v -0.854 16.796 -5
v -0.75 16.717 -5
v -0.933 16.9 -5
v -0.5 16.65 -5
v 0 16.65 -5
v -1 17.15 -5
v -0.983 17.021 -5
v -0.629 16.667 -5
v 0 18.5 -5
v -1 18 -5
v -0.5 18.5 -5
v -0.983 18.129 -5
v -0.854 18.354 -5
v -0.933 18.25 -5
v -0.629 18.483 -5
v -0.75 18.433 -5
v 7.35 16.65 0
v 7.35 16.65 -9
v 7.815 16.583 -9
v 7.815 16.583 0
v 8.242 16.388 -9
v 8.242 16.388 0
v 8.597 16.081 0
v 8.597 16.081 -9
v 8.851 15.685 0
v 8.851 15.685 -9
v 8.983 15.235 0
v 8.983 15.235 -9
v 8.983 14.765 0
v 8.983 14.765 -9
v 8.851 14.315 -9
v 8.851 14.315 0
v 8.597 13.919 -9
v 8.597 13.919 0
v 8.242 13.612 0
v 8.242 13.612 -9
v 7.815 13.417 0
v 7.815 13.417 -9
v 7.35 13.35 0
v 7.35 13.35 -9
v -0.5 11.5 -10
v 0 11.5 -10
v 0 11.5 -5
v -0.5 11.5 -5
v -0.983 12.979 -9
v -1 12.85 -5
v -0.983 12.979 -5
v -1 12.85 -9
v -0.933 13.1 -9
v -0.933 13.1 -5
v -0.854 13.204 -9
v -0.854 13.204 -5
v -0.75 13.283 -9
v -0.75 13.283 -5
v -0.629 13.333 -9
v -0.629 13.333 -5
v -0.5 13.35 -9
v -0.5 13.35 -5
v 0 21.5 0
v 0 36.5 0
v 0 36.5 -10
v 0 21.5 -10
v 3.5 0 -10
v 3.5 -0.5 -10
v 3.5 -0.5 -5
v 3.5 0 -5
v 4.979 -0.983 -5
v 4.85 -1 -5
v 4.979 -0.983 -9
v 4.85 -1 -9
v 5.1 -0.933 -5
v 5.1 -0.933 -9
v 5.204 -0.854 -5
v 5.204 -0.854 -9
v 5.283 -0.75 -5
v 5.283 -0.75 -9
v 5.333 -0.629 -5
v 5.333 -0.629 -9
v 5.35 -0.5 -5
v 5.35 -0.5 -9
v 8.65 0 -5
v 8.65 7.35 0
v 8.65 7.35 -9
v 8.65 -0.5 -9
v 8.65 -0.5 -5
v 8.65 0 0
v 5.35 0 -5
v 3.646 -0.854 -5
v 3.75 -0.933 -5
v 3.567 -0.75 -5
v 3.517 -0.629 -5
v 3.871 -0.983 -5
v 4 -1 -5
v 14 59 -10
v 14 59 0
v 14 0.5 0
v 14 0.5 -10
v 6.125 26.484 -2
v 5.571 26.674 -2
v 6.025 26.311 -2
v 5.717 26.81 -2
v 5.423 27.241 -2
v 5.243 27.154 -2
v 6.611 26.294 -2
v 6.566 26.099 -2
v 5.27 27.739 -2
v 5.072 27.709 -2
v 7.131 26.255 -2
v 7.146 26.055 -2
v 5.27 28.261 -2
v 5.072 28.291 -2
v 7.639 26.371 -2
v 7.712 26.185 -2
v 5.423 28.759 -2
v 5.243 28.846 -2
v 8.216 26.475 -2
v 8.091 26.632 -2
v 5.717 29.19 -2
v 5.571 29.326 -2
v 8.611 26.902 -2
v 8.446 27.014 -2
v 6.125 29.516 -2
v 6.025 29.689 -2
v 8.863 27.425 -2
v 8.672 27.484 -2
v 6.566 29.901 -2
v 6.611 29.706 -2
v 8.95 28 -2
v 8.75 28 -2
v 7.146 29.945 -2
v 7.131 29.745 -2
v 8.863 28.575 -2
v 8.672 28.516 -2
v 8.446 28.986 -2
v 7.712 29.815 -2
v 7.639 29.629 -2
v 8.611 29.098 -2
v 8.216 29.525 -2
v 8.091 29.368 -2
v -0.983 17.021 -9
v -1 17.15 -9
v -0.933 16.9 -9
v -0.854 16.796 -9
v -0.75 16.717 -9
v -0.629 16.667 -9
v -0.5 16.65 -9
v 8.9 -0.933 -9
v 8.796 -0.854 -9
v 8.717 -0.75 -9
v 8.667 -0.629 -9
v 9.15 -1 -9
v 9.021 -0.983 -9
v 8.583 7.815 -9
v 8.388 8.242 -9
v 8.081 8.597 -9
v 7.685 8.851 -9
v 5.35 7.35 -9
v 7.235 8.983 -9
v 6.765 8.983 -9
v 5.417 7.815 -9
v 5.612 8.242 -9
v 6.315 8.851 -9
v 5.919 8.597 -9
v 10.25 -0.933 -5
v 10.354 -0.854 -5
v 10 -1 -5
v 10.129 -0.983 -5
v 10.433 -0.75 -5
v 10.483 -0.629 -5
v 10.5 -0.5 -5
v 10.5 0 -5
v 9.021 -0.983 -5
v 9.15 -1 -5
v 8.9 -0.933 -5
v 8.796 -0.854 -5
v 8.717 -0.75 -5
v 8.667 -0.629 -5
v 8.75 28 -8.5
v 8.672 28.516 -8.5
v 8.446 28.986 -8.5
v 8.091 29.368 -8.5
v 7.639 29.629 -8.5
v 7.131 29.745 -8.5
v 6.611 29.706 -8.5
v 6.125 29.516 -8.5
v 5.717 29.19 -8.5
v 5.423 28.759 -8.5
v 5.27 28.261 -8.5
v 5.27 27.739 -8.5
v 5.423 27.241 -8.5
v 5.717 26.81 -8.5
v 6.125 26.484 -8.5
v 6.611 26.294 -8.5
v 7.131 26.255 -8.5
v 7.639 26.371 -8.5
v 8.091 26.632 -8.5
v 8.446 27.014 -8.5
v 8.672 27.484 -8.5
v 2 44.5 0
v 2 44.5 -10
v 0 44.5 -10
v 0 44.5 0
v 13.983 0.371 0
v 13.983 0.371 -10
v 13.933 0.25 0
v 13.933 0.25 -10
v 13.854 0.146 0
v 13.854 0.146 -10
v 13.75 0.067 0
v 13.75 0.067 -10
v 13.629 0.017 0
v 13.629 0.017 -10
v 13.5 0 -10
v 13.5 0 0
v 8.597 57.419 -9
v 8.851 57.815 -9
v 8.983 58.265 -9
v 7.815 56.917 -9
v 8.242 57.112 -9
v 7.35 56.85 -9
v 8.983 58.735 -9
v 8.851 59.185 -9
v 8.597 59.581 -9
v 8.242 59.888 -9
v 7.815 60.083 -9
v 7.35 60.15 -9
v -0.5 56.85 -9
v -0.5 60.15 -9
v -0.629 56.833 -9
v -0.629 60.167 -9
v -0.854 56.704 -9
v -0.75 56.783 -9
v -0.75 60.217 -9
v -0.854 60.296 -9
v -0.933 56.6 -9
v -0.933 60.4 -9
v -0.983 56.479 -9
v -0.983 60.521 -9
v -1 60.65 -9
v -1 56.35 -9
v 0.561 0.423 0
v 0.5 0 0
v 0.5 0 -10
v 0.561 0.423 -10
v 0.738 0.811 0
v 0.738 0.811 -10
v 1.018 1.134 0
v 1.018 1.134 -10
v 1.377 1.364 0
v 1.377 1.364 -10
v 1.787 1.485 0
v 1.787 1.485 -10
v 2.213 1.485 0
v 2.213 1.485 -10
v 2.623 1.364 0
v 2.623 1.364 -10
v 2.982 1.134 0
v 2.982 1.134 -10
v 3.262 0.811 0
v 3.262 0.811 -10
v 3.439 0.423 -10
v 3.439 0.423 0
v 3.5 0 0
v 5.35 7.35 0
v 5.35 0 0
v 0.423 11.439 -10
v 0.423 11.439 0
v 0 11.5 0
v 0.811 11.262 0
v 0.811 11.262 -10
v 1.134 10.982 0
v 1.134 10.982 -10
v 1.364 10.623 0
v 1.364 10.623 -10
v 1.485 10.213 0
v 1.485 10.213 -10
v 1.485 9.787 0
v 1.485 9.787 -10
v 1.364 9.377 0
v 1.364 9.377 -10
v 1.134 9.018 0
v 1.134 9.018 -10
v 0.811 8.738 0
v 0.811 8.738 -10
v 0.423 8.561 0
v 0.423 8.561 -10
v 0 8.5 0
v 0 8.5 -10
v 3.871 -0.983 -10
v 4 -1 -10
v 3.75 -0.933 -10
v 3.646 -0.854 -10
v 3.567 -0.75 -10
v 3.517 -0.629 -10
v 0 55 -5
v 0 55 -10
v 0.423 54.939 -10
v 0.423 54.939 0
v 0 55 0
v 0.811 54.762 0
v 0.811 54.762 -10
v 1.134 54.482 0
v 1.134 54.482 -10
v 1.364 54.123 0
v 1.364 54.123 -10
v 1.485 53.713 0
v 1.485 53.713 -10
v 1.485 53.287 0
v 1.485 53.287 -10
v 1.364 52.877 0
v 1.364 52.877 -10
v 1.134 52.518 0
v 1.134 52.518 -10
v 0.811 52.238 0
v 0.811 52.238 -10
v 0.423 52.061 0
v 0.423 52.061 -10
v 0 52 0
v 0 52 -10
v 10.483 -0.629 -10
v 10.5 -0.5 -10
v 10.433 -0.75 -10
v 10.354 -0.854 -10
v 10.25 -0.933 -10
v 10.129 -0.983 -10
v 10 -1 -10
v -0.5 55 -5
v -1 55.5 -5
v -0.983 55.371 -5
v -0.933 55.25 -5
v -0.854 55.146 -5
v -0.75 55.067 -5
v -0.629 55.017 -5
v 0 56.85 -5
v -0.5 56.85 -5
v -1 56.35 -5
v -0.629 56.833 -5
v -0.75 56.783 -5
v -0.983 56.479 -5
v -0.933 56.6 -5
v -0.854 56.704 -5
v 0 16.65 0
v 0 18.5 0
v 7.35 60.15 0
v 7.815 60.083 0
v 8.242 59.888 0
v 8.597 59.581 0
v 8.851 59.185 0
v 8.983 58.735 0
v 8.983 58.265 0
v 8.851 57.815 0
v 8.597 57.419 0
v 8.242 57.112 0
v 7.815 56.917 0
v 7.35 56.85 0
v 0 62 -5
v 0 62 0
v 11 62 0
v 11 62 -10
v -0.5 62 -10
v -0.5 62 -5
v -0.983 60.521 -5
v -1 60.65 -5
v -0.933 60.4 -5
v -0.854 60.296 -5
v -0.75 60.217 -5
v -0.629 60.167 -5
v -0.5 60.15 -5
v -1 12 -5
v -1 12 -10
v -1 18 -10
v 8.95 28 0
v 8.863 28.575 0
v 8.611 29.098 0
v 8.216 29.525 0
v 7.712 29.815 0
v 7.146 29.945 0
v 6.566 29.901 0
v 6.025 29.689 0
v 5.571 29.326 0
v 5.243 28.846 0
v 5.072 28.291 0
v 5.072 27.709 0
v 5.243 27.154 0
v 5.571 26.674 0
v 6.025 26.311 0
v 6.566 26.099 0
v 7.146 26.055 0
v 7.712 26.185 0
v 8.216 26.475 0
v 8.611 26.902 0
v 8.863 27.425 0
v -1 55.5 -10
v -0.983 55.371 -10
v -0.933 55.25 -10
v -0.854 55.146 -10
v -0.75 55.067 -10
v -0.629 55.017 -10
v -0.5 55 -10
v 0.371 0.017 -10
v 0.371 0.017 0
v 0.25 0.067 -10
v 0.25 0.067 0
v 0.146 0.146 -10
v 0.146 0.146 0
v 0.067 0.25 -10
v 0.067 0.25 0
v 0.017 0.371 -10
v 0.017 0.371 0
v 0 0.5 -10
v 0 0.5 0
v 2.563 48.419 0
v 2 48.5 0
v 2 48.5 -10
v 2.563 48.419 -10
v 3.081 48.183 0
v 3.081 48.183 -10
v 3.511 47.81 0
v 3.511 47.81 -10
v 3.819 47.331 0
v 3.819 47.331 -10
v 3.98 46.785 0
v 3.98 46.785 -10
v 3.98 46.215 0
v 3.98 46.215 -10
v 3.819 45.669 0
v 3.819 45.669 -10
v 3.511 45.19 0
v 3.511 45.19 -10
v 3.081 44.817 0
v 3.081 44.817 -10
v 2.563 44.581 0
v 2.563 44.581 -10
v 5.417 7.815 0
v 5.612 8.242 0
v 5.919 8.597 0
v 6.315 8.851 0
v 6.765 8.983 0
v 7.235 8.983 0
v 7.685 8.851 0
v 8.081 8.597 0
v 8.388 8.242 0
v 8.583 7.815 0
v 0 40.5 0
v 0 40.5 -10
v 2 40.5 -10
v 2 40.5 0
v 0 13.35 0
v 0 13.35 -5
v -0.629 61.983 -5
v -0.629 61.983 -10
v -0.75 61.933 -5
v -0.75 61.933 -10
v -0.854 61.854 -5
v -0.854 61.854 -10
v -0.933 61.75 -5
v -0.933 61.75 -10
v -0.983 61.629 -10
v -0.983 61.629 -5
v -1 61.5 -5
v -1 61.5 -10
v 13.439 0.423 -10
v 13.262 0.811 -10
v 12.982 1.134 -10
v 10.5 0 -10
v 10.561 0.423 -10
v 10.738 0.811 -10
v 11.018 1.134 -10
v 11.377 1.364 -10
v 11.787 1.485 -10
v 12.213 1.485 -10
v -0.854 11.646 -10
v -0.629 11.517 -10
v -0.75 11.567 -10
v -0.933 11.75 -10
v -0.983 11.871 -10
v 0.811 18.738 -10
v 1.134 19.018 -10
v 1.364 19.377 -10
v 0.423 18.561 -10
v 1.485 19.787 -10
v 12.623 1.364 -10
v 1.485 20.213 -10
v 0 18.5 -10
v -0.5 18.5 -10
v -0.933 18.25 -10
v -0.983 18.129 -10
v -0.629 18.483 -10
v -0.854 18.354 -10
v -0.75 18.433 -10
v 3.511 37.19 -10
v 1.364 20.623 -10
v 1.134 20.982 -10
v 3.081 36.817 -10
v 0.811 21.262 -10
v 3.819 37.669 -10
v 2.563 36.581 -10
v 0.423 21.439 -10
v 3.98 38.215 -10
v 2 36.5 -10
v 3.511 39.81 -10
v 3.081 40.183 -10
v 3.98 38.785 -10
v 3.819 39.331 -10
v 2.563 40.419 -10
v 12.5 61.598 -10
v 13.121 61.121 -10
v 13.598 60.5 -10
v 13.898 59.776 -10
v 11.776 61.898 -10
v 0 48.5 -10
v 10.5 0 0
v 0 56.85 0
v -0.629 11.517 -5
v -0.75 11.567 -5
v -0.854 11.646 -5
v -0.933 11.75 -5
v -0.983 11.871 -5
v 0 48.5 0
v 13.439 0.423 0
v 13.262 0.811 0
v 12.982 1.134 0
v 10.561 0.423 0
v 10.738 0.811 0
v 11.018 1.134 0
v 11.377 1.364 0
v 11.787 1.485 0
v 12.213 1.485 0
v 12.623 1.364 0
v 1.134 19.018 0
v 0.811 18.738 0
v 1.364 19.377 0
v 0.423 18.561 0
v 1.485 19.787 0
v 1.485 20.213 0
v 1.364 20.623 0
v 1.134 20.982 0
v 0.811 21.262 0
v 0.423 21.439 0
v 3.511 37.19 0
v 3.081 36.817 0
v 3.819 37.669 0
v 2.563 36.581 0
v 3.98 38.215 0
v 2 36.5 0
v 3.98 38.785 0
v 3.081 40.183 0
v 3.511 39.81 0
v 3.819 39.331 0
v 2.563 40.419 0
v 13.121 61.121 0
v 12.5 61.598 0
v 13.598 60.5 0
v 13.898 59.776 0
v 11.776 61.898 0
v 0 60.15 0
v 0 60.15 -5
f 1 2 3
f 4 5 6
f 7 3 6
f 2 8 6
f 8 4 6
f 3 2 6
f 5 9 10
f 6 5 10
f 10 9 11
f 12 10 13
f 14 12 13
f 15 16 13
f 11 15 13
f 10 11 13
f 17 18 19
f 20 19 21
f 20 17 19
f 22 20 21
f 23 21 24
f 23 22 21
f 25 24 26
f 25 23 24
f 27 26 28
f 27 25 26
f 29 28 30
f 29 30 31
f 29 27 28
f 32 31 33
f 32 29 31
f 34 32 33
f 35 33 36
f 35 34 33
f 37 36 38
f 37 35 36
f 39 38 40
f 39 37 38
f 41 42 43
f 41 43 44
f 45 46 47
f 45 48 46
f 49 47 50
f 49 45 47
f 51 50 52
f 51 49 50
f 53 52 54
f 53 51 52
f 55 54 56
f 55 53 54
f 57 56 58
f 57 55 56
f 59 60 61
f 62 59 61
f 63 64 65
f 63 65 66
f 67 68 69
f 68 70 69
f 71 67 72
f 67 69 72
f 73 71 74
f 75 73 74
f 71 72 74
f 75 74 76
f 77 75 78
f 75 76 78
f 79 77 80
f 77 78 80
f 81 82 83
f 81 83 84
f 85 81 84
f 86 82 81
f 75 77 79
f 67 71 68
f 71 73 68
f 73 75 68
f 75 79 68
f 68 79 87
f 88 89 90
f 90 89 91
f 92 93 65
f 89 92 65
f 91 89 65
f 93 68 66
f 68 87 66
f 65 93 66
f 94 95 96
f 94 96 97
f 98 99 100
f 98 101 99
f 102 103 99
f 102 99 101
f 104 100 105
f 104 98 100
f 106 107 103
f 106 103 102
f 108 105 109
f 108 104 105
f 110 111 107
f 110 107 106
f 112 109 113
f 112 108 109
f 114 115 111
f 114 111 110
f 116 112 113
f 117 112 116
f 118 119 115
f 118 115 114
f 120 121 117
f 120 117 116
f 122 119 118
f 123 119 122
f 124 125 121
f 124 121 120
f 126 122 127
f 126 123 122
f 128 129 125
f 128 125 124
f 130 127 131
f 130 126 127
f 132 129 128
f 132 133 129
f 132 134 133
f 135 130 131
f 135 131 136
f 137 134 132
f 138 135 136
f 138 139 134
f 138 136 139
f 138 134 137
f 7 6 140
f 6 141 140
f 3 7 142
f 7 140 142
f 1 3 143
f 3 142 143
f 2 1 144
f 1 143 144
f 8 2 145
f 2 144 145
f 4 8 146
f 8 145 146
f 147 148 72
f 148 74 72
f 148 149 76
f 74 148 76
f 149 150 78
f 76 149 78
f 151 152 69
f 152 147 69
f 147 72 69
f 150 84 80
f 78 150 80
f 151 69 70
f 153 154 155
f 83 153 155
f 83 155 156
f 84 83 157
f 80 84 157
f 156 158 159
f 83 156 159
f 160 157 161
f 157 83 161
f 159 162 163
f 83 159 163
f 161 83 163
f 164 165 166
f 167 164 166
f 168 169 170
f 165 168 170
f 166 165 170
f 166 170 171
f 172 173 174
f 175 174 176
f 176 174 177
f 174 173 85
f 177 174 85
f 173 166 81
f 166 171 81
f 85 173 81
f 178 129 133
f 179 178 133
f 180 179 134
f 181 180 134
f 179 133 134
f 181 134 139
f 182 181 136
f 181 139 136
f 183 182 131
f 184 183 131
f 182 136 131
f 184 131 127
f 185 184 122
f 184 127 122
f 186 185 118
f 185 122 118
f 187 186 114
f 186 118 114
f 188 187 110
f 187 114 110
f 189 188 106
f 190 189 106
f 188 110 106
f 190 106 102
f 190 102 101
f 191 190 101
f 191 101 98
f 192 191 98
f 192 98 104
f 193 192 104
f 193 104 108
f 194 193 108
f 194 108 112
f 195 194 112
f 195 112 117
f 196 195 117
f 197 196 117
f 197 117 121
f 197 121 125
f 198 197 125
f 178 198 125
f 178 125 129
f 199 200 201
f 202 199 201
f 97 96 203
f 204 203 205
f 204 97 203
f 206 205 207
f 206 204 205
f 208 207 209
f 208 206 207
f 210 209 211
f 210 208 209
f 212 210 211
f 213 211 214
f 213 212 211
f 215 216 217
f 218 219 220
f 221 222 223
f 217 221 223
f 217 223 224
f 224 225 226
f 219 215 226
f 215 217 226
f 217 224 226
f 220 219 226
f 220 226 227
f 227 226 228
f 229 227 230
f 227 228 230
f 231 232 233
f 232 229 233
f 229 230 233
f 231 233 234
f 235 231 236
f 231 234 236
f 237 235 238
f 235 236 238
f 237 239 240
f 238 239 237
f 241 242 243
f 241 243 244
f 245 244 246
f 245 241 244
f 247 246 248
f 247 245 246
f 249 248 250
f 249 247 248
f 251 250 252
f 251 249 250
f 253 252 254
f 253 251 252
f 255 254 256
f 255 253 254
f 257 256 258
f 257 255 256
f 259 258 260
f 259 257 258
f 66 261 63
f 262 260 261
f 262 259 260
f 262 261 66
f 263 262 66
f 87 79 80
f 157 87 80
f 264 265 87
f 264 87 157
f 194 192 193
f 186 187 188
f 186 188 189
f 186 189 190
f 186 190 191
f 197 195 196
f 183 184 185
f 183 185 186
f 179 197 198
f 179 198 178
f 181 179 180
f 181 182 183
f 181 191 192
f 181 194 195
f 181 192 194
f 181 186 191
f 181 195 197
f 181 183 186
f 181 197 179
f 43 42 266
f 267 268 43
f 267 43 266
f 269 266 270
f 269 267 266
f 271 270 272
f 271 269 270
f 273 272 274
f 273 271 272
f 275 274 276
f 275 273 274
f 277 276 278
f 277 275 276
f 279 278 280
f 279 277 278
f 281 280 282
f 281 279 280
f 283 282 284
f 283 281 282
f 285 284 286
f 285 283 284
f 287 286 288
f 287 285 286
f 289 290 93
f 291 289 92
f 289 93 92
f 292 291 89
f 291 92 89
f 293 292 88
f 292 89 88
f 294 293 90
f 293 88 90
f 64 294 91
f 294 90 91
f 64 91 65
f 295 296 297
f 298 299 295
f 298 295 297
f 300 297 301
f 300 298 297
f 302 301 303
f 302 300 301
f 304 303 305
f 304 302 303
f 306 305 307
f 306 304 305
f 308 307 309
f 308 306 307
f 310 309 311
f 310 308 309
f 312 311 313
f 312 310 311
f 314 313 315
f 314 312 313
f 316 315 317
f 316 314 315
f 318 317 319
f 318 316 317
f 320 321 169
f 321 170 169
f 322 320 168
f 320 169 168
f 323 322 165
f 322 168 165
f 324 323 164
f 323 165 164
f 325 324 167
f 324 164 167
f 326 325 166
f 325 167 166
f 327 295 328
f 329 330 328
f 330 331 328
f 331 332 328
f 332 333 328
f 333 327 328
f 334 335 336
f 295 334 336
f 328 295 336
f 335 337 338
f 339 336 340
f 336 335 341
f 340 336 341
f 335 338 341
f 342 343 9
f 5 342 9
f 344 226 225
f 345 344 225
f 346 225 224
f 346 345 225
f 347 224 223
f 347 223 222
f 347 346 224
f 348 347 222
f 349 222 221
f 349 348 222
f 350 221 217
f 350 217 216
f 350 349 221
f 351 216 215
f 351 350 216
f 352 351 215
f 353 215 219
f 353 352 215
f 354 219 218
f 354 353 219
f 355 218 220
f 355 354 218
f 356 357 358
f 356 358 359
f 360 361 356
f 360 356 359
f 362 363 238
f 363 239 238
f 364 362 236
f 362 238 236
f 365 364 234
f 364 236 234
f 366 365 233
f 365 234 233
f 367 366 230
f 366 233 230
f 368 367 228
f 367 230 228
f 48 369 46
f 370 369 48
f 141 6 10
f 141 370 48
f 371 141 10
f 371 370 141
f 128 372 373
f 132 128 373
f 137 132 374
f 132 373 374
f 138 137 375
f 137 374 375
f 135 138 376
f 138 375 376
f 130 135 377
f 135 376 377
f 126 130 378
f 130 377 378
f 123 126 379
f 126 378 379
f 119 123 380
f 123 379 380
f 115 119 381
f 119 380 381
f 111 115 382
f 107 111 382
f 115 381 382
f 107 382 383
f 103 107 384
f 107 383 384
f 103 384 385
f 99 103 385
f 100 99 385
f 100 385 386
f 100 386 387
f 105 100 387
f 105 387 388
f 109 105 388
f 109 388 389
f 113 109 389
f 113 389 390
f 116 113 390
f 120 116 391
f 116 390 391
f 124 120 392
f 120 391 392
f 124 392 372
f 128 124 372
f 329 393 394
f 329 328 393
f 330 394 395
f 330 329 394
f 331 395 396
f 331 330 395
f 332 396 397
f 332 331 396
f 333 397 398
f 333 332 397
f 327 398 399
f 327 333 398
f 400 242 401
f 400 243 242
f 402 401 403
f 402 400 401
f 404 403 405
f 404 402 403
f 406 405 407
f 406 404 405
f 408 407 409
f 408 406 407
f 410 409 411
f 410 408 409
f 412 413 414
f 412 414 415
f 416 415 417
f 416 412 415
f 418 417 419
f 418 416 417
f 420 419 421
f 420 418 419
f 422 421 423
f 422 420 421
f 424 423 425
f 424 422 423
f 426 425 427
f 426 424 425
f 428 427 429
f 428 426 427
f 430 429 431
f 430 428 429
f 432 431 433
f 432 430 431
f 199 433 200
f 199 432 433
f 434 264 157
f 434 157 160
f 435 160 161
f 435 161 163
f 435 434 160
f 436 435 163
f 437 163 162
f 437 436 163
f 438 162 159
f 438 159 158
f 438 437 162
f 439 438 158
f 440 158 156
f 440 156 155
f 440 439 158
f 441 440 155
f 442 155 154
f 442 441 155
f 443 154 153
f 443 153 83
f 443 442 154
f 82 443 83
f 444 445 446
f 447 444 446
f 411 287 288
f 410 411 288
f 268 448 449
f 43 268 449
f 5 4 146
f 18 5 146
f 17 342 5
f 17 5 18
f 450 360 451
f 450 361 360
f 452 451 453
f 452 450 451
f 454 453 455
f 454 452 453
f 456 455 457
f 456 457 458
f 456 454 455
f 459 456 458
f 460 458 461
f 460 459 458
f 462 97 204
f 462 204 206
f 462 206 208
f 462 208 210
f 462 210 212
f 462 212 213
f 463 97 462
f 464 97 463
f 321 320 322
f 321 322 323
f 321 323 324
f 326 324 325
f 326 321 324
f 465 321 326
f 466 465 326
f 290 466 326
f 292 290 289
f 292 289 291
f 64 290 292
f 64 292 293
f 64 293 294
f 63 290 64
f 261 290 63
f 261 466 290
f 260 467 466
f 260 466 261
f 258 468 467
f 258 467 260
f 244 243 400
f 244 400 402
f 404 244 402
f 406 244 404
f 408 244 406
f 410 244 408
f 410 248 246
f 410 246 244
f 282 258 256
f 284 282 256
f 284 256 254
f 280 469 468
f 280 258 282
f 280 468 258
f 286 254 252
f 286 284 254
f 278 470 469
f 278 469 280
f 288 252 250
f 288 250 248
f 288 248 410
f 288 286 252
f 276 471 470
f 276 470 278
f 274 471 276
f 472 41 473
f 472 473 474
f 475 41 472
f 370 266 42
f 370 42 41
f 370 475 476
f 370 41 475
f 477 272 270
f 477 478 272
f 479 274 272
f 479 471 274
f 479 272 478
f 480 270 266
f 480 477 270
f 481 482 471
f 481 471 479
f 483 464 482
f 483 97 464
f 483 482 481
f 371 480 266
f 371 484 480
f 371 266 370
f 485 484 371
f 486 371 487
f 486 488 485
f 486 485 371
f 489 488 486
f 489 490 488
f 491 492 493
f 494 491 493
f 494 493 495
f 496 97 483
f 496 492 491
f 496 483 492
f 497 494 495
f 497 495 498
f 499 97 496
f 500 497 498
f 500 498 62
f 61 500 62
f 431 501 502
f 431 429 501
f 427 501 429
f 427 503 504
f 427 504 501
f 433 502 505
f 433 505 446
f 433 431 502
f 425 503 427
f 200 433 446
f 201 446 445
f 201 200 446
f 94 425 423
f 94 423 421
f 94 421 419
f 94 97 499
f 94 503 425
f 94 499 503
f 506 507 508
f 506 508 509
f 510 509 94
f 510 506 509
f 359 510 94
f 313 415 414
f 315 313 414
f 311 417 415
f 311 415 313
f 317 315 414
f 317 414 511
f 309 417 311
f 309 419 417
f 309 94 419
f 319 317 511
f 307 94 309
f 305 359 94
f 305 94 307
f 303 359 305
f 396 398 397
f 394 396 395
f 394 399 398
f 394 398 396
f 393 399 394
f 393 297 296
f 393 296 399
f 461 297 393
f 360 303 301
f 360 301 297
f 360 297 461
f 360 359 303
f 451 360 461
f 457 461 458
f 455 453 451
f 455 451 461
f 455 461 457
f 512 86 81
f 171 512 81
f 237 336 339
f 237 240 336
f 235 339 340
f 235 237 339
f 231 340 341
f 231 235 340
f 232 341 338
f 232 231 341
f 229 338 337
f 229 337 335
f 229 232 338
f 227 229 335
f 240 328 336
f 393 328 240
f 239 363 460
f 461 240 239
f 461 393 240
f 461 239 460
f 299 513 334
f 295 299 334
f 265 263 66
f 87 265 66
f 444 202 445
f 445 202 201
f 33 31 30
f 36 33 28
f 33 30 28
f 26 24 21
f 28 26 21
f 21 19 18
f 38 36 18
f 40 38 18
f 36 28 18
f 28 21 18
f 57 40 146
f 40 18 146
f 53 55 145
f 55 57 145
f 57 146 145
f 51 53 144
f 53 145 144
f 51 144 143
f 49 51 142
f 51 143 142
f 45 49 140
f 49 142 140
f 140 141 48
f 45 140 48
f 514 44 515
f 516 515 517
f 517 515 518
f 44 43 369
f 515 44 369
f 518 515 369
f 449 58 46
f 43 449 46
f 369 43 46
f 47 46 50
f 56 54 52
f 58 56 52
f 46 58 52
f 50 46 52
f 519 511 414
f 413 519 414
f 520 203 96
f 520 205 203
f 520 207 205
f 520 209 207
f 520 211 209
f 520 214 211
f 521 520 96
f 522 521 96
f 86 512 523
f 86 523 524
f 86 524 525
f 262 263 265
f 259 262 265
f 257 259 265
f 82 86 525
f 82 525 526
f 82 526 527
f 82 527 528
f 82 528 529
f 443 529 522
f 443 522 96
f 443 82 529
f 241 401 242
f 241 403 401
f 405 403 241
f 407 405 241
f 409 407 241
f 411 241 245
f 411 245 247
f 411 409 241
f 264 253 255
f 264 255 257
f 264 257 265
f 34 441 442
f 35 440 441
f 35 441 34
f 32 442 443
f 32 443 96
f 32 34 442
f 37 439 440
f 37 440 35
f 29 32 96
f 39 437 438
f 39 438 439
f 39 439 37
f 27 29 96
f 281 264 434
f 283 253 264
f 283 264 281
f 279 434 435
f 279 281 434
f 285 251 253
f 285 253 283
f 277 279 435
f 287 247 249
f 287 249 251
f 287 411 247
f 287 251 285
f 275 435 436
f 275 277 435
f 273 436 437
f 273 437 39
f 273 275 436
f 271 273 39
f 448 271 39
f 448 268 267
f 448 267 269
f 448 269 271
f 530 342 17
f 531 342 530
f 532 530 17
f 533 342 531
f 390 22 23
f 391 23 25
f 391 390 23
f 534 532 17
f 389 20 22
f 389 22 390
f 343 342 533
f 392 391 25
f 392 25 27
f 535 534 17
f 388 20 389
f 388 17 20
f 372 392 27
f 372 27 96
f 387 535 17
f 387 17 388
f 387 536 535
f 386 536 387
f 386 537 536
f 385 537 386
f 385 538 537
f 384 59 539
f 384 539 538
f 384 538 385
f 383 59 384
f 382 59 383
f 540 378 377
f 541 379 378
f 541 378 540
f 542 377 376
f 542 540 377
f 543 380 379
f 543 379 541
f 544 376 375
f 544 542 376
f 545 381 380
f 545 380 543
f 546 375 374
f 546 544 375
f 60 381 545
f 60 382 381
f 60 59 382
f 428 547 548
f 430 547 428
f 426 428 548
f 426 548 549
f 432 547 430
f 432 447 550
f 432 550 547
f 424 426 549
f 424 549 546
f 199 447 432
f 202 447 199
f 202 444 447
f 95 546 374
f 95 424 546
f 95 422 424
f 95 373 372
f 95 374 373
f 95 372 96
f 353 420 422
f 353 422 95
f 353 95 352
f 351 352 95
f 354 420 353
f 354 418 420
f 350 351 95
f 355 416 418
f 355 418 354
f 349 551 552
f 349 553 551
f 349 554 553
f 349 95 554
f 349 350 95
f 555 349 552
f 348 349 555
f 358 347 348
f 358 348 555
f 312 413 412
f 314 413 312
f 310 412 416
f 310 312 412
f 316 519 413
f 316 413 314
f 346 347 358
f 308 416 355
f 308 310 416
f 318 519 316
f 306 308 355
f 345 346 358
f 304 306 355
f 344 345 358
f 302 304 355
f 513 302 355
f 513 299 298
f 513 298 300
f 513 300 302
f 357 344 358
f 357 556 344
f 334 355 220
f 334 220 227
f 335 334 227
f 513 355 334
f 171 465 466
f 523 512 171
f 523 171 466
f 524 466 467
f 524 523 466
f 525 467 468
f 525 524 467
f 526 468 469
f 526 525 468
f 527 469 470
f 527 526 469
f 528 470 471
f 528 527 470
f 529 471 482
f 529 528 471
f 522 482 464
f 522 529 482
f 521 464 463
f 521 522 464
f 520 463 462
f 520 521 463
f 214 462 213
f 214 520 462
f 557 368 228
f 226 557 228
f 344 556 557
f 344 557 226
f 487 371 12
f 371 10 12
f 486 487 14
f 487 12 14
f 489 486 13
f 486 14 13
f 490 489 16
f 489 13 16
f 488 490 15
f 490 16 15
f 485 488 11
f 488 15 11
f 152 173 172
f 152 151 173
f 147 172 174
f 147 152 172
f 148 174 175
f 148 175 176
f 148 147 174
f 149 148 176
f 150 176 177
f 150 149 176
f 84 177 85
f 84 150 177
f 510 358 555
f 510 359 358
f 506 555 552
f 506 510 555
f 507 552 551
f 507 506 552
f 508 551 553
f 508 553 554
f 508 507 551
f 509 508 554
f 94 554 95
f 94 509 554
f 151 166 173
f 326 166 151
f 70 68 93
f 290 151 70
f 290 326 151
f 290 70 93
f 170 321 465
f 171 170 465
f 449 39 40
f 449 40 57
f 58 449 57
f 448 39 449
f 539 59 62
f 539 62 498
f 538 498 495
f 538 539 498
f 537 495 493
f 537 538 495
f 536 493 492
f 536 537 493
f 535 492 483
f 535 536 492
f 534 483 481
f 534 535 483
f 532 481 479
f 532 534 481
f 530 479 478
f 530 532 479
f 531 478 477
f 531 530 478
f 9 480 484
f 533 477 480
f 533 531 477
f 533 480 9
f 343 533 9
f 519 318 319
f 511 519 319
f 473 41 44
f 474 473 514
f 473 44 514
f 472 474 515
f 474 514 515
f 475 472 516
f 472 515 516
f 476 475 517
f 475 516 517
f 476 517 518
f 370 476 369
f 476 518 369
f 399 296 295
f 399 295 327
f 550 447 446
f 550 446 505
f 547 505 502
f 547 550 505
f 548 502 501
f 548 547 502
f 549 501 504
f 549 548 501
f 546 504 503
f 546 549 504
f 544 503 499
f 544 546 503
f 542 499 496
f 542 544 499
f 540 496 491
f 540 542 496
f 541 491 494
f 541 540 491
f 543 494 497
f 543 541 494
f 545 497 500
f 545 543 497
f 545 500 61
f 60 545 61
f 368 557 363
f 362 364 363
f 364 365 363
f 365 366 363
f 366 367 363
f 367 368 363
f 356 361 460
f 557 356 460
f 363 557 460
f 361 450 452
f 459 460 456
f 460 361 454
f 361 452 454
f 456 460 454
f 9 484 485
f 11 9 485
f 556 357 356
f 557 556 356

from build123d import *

# Parameters (mm, degrees)
SKETCH4_W           = 10
SKETCH4_H           = 62
BOSS_EXTRUDE1_DEPTH = 14
SKETCH10_W          = 1
SKETCH10_H          = 7
SKETCH10_W_2        = 7
SKETCH10_H_2        = 1
BOSS_EXTRUDE2_DEPTH = 5
CUT_EXTRUDE2_DEPTH  = 65.342831769
CUT_EXTRUDE6_DEPTH  = 65.342831769
SKETCH11_R          = 1.75
CUT_EXTRUDE7_DEPTH  = 8.5
SKETCH12_R          = 1.95
CUT_EXTRUDE8_DEPTH  = 2
CUT_EXTRUDE9_DEPTH  = 9
FILLET1_R           = 3
FILLET3_R           = 0.5


with BuildPart() as part:
    # Sketch4 → Boss-Extrude1 (new body)
    with BuildSketch(Plane(origin=(0, 0, 0), x_dir=(0, 0, -1), z_dir=(1, 0, 0))):
        with Locations((5, 31)):
            Rectangle(SKETCH4_W, SKETCH4_H)
    extrude(amount=BOSS_EXTRUDE1_DEPTH)

    # Sketch10 → Boss-Extrude2 (add)
    with BuildSketch(Plane(origin=(0, 0, -10), x_dir=(-1, 0, 0), z_dir=(0, 0, -1))):
        with Locations((0.5, 15)):
            Rectangle(SKETCH10_W, SKETCH10_H)
        with Locations((0.5, 58.5)):
            Rectangle(SKETCH10_W, SKETCH10_H)
        with Locations((-7, -0.5)):
            Rectangle(SKETCH10_W_2, SKETCH10_H_2)
    extrude(amount=-BOSS_EXTRUDE2_DEPTH)

    # Sketch5 → Cut-Extrude2 (cut, through all)
    with BuildSketch(Plane.XY):
        with BuildLine():
            Line((2, 44.5), (0, 44.5))
            Line((0, 44.5), (0, 48.5))
            Line((0, 48.5), (2, 48.5))
            ThreePointArc((2, 48.5), (4, 46.5), (2, 44.5))
        make_face()
        with BuildLine():
            Line((2, 36.5), (0, 36.5))
            Line((0, 36.5), (0, 40.5))
            Line((0, 40.5), (2, 40.5))
            ThreePointArc((2, 40.5), (4, 38.5), (2, 36.5))
        make_face()
    extrude(amount=-CUT_EXTRUDE2_DEPTH, mode=Mode.SUBTRACT)

    # Sketch9 → Cut-Extrude6 (cut, through all)
    with BuildSketch(Plane.XY):
        with BuildLine():
            Line((0, 52), (-1, 52))
            ThreePointArc((-1, 52), (-2.5, 53.5), (-1, 55))
            Line((-1, 55), (0, 55))
            ThreePointArc((0, 55), (1.5, 53.5), (0, 52))
        make_face()
        with BuildLine():
            Line((0, 18.5), (-1, 18.5))
            ThreePointArc((-1, 18.5), (-2.5, 20), (-1, 21.5))
            Line((-1, 21.5), (0, 21.5))
            ThreePointArc((0, 21.5), (1.5, 20), (0, 18.5))
        make_face()
        with BuildLine():
            Line((0, 8.5), (-1, 8.5))
            ThreePointArc((-1, 8.5), (-2.5, 10), (-1, 11.5))
            Line((-1, 11.5), (0, 11.5))
            ThreePointArc((0, 11.5), (1.5, 10), (0, 8.5))
        make_face()
        with BuildLine():
            Line((0.5, -1), (0.5, 0))
            ThreePointArc((0.5, 0), (2, 1.5), (3.5, 0))
            Line((3.5, 0), (3.5, -1))
            ThreePointArc((3.5, -1), (2, -2.5), (0.5, -1))
        make_face()
        with BuildLine():
            Line((13.5, 0), (13.5, -1))
            ThreePointArc((13.5, -1), (12, -2.5), (10.5, -1))
            Line((10.5, -1), (10.5, 0))
            ThreePointArc((10.5, 0), (12, 1.5), (13.5, 0))
        make_face()
    extrude(amount=-CUT_EXTRUDE6_DEPTH, mode=Mode.SUBTRACT)

    # Sketch11 → Cut-Extrude7 (cut)
    with BuildSketch(Plane.XY):
        with Locations((7, 28)):
            Circle(SKETCH11_R)
    extrude(amount=-CUT_EXTRUDE7_DEPTH, mode=Mode.SUBTRACT)

    # Sketch12 → Cut-Extrude8 (cut)
    with BuildSketch(Plane.XY):
        with Locations((7, 28)):
            Circle(SKETCH12_R)
    extrude(amount=-CUT_EXTRUDE8_DEPTH, mode=Mode.SUBTRACT)

    # Sketch13 → Cut-Extrude9 (cut)
    with BuildSketch(Plane.XY):
        with BuildLine():
            Line((8.65, 7.35), (8.65, -1))
            ThreePointArc((8.65, -1), (7, -2.65), (5.35, -1))
            Line((5.35, -1), (5.35, 7.35))
            ThreePointArc((5.35, 7.35), (7, 9), (8.65, 7.35))
        make_face()
        with BuildLine():
            Line((7.35, 13.35), (-1, 13.35))
            ThreePointArc((-1, 13.35), (-2.65, 15), (-1, 16.65))
            Line((-1, 16.65), (7.35, 16.65))
            ThreePointArc((7.35, 16.65), (9, 15), (7.35, 13.35))
        make_face()
        with BuildLine():
            Line((7.35, 56.85), (-1, 56.85))
            ThreePointArc((-1, 56.85), (-2.65, 58.5), (-1, 60.15))
            Line((-1, 60.15), (7.35, 60.15))
            ThreePointArc((7.35, 60.15), (9, 58.5), (7.35, 56.85))
        make_face()
    extrude(amount=-CUT_EXTRUDE9_DEPTH, mode=Mode.SUBTRACT)

    # Fillet1
    fillet1_edges = [part.edges().sort_by_distance(p)[0] for p in [
        (14, 62, -5),
    ]]
    fillet(fillet1_edges, radius=FILLET1_R)

    # Fillet3
    fillet3_edges = [part.edges().sort_by_distance(p)[0] for p in [
        (14, 0, -5),
        (0, 0, -5),
        (-1, 55, -7.5),
        (-1, 62, -7.5),
        (-1, 18.5, -7.5),
        (-1, 11.5, -7.5),
        (3.5, -1, -7.5),
        (10.5, -1, -7.5),
        (-1, 56.85, -7),
        (-1, 60.15, -7),
        (-1, 13.35, -7),
        (-1, 16.65, -7),
        (5.35, -1, -7),
        (8.65, -1, -7),
    ]]
    fillet(fillet3_edges, radius=FILLET3_R - 0.0001)  # a hair under: the kernel refuses the full size


solid = part.part
